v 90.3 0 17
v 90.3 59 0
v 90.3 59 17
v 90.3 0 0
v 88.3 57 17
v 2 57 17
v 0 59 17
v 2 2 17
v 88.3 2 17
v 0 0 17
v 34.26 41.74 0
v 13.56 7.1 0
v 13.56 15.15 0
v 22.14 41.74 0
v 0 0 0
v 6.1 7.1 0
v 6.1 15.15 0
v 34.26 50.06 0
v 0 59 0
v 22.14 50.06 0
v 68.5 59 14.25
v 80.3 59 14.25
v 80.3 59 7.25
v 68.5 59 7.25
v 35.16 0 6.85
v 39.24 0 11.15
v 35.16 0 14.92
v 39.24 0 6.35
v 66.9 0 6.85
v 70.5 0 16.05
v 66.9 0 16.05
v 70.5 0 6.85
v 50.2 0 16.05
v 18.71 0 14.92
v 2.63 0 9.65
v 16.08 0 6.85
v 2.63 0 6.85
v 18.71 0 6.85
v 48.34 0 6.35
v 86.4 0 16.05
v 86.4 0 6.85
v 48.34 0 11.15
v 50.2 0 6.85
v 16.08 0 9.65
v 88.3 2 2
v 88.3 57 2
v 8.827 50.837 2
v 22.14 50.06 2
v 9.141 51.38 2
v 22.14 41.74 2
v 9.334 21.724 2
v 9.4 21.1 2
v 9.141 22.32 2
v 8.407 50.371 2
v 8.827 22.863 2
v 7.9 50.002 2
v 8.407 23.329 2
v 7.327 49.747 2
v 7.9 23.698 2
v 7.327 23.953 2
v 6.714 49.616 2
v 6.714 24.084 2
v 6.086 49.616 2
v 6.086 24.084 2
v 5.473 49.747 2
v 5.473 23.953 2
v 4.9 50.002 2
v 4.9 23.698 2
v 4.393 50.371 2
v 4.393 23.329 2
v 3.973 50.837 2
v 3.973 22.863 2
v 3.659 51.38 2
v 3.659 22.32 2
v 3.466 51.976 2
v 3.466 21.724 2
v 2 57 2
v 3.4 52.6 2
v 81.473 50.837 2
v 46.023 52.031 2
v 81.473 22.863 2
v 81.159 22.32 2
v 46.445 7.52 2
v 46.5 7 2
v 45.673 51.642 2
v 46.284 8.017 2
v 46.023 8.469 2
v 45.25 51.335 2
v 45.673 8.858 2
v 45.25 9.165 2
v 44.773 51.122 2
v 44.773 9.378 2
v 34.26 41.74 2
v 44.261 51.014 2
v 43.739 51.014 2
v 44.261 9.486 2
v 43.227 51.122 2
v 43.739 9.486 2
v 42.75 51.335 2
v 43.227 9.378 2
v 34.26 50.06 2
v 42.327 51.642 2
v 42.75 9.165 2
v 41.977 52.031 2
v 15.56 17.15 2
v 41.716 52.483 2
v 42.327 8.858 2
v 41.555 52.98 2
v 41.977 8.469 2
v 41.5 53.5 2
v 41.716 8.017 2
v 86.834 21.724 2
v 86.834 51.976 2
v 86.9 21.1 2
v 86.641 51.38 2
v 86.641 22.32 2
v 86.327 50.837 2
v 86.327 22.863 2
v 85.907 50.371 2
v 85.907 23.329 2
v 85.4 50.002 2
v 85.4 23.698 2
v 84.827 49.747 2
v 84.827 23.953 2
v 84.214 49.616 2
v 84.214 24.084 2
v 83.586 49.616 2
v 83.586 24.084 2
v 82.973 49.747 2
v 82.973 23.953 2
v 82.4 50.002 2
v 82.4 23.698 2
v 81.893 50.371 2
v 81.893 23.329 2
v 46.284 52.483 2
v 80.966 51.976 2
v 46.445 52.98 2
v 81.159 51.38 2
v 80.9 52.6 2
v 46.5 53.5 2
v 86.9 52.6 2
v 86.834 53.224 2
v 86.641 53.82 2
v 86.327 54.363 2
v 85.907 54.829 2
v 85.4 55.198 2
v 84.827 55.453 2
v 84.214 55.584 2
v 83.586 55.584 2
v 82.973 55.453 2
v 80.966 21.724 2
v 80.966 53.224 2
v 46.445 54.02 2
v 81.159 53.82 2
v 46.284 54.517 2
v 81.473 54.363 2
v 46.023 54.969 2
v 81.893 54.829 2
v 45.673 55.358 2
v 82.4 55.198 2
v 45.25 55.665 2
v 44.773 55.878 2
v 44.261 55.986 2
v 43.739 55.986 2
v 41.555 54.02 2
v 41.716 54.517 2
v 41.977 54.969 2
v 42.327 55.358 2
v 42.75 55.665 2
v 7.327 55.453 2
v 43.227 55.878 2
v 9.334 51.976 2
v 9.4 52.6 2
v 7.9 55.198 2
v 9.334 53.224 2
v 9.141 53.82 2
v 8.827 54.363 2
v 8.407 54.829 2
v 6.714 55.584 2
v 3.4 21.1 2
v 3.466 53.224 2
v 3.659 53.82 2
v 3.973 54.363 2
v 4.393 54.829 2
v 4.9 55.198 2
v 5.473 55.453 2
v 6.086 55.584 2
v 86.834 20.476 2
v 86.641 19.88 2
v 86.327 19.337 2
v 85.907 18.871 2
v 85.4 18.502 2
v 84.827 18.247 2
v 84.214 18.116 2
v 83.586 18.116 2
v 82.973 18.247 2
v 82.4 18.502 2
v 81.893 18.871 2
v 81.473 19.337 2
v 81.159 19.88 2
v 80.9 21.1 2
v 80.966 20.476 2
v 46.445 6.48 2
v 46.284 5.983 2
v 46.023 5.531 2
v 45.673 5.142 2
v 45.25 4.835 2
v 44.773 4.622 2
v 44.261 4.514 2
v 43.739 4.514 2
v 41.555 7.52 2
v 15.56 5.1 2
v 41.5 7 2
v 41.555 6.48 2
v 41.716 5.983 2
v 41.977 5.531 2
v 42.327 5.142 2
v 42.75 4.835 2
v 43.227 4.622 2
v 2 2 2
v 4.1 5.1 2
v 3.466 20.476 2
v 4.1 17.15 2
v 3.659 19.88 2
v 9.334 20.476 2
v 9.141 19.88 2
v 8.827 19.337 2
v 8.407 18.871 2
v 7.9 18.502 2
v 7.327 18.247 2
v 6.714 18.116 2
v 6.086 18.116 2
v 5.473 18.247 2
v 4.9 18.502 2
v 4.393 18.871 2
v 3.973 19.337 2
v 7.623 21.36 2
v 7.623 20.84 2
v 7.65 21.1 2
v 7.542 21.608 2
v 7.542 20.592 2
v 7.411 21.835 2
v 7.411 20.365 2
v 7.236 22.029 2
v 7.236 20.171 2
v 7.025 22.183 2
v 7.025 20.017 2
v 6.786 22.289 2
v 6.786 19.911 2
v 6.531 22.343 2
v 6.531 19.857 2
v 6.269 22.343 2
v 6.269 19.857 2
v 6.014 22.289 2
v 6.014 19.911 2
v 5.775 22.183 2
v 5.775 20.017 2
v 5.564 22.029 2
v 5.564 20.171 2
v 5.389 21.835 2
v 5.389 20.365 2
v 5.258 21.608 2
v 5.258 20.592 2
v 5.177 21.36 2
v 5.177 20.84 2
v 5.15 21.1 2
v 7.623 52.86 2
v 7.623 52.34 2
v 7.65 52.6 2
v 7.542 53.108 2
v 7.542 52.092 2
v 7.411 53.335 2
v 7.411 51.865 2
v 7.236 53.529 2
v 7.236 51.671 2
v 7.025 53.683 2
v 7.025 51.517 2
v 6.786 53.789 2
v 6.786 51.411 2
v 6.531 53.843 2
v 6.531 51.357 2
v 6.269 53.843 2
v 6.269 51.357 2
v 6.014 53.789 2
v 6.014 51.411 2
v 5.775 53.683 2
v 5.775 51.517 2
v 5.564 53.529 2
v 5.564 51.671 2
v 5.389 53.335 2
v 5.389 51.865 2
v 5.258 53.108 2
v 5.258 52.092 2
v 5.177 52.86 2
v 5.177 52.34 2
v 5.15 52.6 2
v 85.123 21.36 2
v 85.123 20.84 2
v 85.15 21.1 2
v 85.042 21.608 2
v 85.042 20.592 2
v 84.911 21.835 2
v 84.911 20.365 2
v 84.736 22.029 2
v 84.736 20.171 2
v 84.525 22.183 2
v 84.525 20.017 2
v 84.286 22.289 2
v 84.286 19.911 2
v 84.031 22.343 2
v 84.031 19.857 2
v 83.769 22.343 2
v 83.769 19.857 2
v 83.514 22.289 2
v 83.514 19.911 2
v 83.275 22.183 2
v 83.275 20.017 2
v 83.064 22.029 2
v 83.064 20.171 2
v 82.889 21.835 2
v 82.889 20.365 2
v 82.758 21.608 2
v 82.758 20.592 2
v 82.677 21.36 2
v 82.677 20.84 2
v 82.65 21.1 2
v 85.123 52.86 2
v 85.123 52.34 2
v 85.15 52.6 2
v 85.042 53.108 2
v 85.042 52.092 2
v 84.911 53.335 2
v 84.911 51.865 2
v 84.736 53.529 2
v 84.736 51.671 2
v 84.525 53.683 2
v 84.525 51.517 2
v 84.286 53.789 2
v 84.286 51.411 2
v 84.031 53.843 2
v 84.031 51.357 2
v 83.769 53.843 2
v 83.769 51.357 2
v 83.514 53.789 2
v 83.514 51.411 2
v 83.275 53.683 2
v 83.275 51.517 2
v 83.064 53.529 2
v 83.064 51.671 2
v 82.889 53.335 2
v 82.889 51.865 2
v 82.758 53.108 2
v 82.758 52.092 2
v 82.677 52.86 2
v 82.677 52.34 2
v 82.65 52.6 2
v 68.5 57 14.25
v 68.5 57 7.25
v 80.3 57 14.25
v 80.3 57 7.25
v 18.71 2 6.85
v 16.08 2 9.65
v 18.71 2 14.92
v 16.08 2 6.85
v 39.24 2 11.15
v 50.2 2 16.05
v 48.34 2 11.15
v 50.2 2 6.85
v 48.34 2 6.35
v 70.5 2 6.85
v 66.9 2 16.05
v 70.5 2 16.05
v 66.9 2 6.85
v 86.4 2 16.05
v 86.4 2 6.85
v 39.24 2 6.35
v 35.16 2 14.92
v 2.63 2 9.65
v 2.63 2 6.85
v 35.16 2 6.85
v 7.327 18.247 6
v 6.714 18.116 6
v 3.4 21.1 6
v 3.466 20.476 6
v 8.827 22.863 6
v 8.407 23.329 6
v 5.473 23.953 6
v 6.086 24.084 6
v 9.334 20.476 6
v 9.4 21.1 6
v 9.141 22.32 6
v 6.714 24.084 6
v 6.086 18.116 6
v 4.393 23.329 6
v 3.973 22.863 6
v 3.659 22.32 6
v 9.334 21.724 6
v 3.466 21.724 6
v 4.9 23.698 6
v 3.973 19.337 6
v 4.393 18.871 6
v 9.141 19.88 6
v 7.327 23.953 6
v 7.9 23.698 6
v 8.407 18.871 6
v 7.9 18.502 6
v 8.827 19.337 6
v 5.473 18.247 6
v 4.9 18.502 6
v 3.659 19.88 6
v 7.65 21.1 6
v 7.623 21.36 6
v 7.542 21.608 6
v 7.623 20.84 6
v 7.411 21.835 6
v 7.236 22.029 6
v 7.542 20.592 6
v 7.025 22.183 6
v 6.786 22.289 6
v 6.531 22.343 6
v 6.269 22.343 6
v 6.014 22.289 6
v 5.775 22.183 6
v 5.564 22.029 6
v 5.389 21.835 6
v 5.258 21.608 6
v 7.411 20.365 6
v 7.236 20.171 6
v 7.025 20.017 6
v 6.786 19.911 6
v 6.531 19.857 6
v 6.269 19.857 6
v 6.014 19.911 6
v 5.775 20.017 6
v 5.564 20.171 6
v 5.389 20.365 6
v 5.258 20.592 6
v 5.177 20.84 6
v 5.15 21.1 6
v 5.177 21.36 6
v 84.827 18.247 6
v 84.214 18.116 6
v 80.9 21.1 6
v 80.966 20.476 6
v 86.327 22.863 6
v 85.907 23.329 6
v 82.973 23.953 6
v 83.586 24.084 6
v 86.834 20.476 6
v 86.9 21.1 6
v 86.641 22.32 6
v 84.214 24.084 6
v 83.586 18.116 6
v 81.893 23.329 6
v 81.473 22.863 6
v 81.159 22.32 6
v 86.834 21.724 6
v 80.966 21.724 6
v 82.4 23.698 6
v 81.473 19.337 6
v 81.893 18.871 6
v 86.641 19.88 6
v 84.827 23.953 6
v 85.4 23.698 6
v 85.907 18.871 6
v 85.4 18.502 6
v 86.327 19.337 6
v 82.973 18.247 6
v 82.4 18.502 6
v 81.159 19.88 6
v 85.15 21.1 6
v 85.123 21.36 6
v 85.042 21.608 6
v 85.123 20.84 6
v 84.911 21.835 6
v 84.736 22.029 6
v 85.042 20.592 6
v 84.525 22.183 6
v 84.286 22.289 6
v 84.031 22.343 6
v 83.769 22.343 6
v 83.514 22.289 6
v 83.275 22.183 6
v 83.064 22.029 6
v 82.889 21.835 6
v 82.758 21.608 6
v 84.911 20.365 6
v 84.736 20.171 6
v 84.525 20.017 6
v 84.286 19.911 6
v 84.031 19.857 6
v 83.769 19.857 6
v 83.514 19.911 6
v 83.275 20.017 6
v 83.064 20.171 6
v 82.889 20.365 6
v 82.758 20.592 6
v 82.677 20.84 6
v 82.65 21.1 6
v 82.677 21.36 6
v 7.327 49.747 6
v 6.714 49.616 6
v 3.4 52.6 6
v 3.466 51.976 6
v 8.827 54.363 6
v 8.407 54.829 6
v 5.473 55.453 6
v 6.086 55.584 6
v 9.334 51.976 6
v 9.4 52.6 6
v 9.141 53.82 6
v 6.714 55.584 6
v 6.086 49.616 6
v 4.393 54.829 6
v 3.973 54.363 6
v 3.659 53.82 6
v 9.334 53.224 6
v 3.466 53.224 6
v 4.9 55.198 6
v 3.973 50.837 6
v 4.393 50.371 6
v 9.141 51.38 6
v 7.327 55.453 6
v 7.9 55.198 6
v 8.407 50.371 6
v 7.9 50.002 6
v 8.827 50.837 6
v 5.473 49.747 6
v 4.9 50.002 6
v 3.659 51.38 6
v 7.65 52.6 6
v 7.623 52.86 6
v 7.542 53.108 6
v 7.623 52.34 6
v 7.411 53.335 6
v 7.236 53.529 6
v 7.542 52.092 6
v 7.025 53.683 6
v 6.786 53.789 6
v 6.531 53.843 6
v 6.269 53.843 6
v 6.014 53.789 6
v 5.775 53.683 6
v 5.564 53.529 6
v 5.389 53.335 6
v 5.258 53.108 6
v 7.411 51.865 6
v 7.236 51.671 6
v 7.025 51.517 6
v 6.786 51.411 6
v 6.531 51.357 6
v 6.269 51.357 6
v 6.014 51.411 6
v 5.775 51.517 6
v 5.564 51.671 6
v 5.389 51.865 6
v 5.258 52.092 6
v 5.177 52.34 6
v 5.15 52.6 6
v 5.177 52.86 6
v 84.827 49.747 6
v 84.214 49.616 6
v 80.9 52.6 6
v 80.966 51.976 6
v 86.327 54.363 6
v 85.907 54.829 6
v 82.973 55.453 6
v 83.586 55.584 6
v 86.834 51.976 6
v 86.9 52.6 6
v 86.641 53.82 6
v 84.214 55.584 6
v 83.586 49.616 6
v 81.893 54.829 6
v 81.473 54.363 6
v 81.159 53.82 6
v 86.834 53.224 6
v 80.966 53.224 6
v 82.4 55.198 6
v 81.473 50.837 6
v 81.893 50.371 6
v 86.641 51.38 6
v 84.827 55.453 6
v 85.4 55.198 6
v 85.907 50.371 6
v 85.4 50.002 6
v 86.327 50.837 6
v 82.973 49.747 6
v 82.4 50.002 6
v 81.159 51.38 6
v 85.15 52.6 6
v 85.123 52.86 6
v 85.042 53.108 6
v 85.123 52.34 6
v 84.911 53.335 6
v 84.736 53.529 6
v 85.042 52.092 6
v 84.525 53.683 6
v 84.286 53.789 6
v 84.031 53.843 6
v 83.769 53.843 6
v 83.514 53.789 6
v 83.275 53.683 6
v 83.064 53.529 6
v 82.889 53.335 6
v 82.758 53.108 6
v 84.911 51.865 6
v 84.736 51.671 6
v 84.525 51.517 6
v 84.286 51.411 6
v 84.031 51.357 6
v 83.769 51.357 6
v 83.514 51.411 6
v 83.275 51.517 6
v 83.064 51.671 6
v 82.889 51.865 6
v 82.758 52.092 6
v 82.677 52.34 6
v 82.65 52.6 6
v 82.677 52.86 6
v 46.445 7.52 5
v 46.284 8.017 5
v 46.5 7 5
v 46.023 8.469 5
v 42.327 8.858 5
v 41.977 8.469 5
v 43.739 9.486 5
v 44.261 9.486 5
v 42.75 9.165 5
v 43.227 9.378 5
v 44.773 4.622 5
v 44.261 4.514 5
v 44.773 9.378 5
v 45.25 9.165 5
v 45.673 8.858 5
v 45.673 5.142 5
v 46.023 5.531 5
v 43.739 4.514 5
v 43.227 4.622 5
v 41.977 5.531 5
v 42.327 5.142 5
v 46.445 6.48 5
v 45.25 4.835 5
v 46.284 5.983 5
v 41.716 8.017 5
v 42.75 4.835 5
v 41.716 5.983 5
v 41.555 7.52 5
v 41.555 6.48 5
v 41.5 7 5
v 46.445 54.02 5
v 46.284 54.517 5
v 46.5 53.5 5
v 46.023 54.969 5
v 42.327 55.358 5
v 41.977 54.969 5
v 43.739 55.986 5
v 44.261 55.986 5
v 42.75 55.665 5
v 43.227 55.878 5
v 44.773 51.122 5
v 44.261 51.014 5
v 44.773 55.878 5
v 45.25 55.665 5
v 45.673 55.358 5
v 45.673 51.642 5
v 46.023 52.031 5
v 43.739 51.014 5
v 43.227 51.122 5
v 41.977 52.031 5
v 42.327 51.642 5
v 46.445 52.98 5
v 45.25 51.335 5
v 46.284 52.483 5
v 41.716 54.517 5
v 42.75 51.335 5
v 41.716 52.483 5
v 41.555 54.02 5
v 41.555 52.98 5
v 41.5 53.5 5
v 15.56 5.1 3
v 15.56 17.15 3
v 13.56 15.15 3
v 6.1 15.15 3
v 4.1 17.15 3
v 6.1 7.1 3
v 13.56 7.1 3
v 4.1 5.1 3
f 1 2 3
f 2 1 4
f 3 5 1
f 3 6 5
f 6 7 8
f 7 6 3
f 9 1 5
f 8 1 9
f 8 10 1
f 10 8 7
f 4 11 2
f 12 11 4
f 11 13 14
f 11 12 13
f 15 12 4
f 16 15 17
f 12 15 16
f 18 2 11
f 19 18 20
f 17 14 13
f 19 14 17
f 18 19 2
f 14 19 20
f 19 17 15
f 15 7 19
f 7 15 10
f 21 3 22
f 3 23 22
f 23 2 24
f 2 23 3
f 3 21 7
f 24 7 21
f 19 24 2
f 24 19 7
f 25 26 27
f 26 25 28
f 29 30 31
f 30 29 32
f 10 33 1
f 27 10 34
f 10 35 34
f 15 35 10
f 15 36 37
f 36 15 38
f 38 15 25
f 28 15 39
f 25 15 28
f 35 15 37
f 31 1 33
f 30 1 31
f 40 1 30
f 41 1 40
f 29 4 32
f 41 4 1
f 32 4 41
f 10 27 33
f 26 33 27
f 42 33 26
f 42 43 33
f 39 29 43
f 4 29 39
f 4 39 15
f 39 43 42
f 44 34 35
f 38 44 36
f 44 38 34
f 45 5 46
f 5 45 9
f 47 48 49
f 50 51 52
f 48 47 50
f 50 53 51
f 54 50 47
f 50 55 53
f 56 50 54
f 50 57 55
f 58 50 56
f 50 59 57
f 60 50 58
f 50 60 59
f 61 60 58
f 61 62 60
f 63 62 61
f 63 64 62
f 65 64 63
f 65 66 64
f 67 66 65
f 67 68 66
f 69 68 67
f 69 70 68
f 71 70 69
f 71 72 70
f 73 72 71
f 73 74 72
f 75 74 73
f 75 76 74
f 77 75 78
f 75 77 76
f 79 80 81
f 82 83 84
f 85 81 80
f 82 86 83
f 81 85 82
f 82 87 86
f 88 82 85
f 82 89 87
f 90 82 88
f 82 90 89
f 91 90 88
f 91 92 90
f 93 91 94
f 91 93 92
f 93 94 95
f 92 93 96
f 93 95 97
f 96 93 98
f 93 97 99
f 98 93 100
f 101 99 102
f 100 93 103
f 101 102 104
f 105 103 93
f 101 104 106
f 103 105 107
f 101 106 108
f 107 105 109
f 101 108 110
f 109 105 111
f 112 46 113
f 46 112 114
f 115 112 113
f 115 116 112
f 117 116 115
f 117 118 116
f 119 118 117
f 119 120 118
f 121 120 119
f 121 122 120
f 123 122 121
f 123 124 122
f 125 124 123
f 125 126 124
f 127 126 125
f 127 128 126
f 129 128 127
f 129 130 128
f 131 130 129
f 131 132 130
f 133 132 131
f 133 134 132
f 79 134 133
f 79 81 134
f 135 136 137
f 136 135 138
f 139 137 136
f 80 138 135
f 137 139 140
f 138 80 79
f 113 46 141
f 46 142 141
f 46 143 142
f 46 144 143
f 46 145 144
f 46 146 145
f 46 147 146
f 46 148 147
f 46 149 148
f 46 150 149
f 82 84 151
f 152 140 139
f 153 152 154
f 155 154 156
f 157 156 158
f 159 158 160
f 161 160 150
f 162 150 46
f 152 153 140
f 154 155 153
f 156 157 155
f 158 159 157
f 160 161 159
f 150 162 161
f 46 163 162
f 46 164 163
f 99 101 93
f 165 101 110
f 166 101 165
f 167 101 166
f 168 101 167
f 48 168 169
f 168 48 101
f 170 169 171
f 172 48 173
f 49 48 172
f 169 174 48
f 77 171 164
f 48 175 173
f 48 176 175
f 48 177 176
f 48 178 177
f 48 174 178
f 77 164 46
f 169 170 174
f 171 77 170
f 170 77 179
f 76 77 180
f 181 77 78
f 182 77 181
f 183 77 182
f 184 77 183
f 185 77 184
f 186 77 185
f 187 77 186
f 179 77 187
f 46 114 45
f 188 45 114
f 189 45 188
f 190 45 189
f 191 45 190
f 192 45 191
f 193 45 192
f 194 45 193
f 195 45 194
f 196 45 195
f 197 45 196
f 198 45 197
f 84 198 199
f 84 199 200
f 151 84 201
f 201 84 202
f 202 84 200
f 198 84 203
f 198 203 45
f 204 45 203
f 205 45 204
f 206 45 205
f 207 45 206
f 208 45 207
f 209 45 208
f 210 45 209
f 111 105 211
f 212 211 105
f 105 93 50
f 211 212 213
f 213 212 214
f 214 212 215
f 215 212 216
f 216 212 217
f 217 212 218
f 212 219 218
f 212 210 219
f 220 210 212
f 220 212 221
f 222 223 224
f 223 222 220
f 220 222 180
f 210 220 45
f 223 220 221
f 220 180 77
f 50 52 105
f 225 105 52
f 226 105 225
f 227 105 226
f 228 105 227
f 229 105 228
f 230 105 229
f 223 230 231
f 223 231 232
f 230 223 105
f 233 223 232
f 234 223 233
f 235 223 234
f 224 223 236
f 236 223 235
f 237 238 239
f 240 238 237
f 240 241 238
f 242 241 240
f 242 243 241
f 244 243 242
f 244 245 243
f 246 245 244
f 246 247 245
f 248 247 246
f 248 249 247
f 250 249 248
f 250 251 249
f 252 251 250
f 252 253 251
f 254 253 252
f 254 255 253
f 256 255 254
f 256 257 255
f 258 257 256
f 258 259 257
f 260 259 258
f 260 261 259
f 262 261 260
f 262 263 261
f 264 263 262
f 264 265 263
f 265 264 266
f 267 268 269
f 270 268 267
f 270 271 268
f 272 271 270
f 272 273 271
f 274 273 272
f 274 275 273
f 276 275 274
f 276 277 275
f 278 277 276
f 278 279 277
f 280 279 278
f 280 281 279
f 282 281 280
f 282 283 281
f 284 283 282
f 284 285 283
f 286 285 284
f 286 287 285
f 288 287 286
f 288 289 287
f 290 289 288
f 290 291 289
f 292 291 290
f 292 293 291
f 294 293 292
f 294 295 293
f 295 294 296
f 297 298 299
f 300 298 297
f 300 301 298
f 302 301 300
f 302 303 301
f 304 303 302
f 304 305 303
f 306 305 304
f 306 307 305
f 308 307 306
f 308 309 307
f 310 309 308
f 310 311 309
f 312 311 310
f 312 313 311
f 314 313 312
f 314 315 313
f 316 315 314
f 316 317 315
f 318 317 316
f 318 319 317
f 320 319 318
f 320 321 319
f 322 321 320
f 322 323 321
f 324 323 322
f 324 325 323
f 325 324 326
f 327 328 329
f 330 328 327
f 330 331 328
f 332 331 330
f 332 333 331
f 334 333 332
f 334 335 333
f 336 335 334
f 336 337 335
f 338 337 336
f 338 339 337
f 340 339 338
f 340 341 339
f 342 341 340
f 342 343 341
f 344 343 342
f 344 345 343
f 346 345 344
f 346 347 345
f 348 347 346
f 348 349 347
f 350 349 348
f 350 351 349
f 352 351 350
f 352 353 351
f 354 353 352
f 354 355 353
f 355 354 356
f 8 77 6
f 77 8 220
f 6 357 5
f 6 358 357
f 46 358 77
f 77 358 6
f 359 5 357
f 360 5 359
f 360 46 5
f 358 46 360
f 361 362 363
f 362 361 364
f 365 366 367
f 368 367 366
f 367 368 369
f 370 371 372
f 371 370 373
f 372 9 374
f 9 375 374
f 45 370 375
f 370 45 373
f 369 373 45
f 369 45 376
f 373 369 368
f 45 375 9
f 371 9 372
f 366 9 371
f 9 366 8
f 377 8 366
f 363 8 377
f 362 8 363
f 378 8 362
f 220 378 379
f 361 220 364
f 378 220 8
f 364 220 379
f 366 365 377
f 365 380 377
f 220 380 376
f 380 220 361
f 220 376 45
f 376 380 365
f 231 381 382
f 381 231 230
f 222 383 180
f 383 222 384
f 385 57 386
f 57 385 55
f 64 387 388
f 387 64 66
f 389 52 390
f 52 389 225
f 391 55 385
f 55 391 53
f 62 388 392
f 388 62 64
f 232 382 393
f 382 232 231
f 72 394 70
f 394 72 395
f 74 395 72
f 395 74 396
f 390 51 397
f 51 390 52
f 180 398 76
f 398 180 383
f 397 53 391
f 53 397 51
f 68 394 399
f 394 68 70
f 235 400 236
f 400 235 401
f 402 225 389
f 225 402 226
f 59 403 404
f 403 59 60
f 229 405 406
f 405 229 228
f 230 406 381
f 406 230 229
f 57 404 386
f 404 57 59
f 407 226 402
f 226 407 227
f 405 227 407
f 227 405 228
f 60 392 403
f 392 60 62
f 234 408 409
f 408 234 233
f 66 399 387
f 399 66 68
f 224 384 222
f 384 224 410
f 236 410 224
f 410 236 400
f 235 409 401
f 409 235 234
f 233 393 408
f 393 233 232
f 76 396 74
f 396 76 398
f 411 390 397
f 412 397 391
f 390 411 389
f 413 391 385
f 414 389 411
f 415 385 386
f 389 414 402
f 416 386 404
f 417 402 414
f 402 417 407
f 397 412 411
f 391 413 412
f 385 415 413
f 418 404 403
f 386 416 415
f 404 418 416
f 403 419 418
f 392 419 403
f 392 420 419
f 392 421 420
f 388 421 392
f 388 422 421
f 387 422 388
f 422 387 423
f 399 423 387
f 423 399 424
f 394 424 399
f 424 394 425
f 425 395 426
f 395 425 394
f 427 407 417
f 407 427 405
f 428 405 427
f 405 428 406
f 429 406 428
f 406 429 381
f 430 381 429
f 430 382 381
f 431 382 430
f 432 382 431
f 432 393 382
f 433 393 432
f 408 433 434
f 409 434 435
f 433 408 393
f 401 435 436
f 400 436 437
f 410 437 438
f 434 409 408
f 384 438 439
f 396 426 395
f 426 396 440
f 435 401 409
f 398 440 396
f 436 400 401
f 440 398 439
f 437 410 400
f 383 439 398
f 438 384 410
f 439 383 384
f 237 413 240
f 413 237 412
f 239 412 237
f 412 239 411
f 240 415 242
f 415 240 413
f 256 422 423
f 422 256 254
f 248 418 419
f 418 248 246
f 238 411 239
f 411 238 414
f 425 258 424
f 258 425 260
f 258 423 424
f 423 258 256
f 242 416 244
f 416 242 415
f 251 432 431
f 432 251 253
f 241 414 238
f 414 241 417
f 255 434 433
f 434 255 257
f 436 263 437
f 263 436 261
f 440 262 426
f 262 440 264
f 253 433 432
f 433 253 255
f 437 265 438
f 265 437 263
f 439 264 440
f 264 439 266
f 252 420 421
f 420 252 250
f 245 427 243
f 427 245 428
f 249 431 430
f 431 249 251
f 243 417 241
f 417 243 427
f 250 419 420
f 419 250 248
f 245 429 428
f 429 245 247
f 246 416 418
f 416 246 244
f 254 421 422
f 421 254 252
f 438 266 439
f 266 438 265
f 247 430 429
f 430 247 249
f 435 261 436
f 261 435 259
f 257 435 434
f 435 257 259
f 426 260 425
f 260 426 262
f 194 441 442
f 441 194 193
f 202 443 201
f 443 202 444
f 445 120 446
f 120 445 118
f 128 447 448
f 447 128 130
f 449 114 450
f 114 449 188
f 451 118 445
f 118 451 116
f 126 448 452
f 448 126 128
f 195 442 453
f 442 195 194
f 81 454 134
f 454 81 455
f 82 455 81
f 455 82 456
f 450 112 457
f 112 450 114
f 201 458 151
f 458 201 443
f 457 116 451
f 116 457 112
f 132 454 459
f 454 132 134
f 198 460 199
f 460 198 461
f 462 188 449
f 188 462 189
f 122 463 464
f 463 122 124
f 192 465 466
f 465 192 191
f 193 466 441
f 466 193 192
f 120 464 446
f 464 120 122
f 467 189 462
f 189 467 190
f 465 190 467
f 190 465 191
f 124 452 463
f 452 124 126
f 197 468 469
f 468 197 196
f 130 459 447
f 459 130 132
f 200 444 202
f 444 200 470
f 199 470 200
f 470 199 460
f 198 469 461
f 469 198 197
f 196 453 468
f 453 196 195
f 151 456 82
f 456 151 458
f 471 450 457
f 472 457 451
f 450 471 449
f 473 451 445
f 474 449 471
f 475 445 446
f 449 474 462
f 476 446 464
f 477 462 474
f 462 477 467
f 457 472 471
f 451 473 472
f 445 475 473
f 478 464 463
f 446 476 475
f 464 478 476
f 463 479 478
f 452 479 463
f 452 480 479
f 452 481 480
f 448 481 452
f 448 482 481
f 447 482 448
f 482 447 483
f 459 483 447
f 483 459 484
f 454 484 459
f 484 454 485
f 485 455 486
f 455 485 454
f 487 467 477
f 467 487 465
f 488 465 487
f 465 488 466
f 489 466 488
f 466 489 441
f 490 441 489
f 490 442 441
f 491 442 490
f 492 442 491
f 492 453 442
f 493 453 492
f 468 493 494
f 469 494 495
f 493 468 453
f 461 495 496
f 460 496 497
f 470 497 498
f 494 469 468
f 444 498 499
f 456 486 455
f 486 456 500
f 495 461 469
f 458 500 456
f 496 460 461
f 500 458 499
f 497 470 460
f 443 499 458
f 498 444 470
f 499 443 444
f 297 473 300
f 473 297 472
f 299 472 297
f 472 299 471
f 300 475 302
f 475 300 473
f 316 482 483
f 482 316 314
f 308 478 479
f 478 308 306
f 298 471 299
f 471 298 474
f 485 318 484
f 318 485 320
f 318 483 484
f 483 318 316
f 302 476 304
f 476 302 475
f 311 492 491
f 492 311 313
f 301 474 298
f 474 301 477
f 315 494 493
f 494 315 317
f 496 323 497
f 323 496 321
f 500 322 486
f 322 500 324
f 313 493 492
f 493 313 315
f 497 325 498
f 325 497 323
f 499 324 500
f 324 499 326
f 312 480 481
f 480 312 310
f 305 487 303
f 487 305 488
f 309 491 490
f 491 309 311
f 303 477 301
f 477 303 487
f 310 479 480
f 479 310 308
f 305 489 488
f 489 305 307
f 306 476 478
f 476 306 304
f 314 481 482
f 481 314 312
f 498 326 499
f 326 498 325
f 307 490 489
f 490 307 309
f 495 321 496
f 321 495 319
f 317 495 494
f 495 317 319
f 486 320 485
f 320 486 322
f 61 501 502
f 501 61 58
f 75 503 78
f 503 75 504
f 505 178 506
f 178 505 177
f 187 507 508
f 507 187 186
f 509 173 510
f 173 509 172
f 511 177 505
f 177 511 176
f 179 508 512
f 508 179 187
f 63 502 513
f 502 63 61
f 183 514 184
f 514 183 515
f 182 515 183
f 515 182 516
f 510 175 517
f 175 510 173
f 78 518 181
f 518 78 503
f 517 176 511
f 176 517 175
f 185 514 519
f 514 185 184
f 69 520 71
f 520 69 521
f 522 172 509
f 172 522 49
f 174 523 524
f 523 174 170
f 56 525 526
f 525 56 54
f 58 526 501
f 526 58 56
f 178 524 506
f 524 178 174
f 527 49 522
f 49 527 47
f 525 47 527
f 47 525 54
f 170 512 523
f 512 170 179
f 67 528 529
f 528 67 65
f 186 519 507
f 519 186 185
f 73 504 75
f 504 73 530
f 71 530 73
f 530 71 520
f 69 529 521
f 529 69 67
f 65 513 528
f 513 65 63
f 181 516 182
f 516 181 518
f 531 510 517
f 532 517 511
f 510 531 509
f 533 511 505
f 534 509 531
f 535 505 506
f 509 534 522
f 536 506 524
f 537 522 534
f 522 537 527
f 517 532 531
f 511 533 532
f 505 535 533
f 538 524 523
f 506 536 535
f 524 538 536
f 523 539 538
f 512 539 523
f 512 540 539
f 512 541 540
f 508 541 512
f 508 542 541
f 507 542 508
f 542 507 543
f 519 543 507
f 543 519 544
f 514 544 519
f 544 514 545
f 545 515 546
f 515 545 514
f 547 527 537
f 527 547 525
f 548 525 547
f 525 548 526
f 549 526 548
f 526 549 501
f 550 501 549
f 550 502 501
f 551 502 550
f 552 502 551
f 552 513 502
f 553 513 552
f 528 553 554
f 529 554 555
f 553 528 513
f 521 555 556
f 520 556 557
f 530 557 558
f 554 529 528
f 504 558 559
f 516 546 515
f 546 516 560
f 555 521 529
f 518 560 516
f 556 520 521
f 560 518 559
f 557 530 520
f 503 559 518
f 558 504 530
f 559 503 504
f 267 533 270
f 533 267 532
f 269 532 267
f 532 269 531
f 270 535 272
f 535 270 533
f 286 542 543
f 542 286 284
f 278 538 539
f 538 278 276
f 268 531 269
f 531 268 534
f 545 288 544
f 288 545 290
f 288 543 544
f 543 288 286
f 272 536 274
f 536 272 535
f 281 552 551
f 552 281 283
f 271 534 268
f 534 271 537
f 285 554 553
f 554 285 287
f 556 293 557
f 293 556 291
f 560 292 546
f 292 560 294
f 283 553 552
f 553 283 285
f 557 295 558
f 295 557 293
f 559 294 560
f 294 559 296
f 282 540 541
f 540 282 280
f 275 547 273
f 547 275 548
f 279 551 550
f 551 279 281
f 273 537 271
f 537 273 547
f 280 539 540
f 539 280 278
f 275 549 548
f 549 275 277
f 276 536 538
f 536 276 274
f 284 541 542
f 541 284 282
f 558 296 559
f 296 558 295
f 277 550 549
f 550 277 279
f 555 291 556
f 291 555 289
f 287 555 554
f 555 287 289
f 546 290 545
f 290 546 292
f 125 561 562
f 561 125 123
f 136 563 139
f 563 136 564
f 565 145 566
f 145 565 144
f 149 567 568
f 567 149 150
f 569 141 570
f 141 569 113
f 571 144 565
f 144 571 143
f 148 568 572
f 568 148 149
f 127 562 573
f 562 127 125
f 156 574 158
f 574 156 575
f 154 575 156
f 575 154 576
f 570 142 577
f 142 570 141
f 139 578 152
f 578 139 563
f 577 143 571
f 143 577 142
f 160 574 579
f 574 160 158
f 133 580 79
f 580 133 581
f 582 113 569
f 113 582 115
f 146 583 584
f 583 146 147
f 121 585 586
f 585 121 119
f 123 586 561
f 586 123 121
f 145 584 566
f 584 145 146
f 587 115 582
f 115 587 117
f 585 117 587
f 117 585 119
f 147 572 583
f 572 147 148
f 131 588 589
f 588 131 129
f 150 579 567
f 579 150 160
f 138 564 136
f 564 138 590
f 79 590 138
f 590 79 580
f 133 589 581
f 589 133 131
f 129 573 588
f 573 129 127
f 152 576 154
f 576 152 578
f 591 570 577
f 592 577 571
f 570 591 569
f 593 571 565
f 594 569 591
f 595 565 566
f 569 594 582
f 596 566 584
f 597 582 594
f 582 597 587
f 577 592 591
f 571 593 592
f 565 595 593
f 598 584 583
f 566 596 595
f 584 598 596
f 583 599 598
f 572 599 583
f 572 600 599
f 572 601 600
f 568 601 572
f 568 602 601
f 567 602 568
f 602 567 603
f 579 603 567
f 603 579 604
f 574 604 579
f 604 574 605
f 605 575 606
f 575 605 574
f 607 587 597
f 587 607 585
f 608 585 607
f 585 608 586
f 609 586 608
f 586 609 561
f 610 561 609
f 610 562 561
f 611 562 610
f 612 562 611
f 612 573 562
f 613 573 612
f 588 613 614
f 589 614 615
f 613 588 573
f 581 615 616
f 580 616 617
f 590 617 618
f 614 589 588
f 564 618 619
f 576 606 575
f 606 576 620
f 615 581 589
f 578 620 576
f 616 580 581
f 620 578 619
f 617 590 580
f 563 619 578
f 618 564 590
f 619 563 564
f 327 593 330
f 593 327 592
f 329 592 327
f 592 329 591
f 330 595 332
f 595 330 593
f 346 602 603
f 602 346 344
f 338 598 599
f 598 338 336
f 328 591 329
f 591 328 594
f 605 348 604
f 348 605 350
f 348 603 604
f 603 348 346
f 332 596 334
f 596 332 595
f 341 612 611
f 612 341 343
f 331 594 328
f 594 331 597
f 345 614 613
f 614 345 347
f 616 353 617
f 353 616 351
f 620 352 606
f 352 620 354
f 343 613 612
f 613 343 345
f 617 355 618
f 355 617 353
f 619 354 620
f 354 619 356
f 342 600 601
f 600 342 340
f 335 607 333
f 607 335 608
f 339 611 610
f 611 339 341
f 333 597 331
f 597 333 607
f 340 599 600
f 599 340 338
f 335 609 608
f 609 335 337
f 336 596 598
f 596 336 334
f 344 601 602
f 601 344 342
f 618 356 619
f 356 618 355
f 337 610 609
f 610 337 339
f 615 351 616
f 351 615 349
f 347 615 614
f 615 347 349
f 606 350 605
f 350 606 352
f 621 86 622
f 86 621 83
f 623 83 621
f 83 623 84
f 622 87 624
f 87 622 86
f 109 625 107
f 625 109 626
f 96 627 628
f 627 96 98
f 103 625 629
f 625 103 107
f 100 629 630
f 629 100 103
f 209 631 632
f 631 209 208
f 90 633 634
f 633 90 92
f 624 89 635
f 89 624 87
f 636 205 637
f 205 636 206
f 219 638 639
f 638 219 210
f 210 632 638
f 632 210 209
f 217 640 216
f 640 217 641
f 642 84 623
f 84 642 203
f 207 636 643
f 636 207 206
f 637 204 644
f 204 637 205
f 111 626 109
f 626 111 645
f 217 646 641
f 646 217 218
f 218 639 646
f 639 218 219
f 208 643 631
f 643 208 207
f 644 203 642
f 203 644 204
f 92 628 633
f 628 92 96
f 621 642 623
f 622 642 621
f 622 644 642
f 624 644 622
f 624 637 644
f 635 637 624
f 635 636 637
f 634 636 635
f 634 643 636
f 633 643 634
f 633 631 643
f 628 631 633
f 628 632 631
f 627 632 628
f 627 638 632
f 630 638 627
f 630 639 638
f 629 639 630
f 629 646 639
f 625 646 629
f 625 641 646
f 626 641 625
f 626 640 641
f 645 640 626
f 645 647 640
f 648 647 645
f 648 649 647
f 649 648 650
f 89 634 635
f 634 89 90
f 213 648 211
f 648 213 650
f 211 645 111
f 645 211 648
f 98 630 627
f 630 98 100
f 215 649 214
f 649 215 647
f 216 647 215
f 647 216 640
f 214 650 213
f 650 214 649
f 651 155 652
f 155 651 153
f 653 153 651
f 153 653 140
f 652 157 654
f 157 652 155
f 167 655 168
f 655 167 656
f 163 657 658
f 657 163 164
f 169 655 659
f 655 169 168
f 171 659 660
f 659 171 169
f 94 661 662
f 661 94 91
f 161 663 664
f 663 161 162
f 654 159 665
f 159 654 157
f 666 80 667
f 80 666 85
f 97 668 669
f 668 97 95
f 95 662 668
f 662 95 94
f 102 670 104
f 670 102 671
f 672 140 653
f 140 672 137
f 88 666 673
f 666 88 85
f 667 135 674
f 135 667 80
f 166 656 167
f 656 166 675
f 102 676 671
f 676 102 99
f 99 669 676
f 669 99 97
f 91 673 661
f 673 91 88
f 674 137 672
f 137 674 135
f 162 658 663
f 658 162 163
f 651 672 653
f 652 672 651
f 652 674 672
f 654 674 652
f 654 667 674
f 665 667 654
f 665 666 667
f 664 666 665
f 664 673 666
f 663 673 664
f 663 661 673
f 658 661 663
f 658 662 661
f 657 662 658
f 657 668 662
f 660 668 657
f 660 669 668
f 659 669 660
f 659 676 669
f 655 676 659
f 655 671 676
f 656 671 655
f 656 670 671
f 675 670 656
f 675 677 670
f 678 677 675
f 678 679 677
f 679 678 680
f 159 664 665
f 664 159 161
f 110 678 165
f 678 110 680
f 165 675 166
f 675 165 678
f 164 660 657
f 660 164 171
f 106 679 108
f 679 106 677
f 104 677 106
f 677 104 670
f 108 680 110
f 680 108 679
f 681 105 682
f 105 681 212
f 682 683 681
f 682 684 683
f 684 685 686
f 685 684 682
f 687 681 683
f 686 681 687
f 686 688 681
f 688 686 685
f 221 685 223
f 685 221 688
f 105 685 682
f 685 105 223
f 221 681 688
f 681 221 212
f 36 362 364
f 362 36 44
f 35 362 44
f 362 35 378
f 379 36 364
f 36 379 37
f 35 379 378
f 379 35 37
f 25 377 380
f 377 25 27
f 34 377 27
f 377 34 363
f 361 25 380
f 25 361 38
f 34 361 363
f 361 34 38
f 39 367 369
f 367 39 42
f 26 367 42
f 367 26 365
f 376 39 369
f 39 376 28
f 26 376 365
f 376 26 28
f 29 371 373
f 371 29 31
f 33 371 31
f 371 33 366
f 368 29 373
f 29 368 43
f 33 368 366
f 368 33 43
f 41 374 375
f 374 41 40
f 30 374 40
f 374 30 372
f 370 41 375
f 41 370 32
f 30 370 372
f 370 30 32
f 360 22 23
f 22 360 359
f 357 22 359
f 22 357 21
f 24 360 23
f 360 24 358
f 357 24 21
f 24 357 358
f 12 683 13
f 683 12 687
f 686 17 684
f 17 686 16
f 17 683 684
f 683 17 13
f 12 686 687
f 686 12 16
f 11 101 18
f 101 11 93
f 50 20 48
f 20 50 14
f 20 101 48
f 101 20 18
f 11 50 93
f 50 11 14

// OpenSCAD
// wall thickness
th = 2;

// board size
bx = 85.5;
by = 54.2;

// gap around board 
g = 0.4;
thg = th + g;

// outter dimensions
ox = bx + (thg * 2);
oy = by + (thg * 2);

// board z offset
bzo = 4 + th;

module basicBox()
{
    difference()
    {
        cube([ox, oy, 17]);
        translate([th, th, th])
            cube([bx + g * 2, by + g * 2, 17]);
    }
}

module stand( x, y )
{
    translate([x, y, 0])
    {
        difference() {
        cylinder( bzo, d = 6, $fn = 30 );
        cylinder( bzo, d = 2.5, $fn = 30 );
        }
    }
}

module BottomScrewHole( x, y )
{
    translate([x, y, -1])
    {
        cylinder( bzo + 2, d = 3.2, $fn = 30 );
        cylinder( 6 - th, d = 7.1, $fn = 6 );
    }
}

module TopScrewHole( x, y )
{
    translate([x, y, -1])
    {
        cylinder( 9.6 + 2 + th, d = 3.1, $fn = 30 );
        cylinder( th + 1, d = 6.2, $fn = 30 );
    }
}
module TopScrewMount( x, y )
{
    translate([x, y, 0])
    {
        cylinder( th + 9.6, d = 6.2, $fn = 60 );
    }
}

module frontHole(x, z, w, h)
{
    translate([x, -10, z + 1.25])
        cube([w, 13, h + (g * 2)]);
}

module bottom() 
{
    difference()
    {
        union()
        {
            basicBox();
            translate([thg, thg, 0])
            {
                stand( 4, 18.7 );
                stand( bx - 4, 18.7 );
                stand( 4, 50.2 );
                stand( bx - 4, 50.2 );
            }
            // more supports
            translate([44, th + 5, 0])
            {
                cylinder( bzo-1, d = 5, $fn = 30 );
            }
            translate([44, 53.5, 0])
            {
                cylinder( bzo-1, d = 5, $fn = 30 );
            }
            
            translate([6.5 - thg, 7.5 - thg, 0])
            {
                cube([6.66 + (2 * thg), 7.25 + (2 * thg), th +1]);
            }
        }
        union()
        {
            // SD card
            frontHole( 2.63, bzo - g, 13.45, 2.00 );
            
            // HDMI
            frontHole( 18.71, bzo - g, 16.45, 7.27 );
            
            // otg
            frontHole( 39.24, (bzo - 0.5) - g, 9.1, 4 );
            
            // USB1
            frontHole( 50.2, bzo - g, 16.7, 8.4 );
            
            // USB2
            frontHole( 70.5, bzo - g, 15.9, 8.4 );
            
            // power 
            translate([68.5, oy - 10, bzo + 1.25])
                cube([11.8, 20, 7]);
            
            // switches
            translate([6.5 - g, 7.5 - g, -1])
                cube([6.66 + (2 * g), 7.25 + (2 * g), bzo + 2]);
                
            // JTAG
            jtag_width = 7.32;
            jtag_length = 3.52;
            jtag_offset = 2.4;
            jtag_x = jtag_width + (2 * jtag_offset);
            jtag_y = jtag_length + (2 * jtag_offset);
            
            translate([27.8 + g, 45.5 + g, -1])
                cube([jtag_x, jtag_y, 17], center=true);
                
            // UART
            uart_width = 42.0;
            uart_length = 15.4;
            uart_thickness = 10.0;
            uart_offset = 2.0;
            uart_x = uart_width + (2 * uart_offset);
            uart_y = uart_length + (2 * uart_offset);
            
            //translate([8, by,  9])
                //cube([42 + 4, th + 4, 25]);
            
                // GPIO access
            //translate([9, thg - 3, -1])
              //  cube([42 + 4, 9.75, th + 2]);
              
            // screw holes with captured nuts
            translate([thg, thg, 0])
            {
                //BottomScrewHole( 4, 18.7 );
                //BottomScrewHole( bx - 4, 18.7 );
                //BottomScrewHole( 4, 50.2 );
                //BottomScrewHole( bx - 4, 50.2 );
            }
        }
    }
}

module topSupport(x, y, type)
{
    translate([x, y, th])
    {
        if( type == "a" )
            cube([th, 6, 5]);
        if( type == "b" )
            cube([6, th, 5]);
    }
}

module top()
{
    difference()
    {
        union()
        {
            cube([ox, oy, th]);
            //topSupport( thg, thg, "a" );
            //topSupport( thg, 34, "a" );
            topSupport( ox - (thg + th), thg, "a" );
            topSupport( ox - (thg + th), oy - (thg + 6 + 17), "a" );
            topSupport( thg, oy - (thg + 6), "a" );
            
            topSupport( 60, thg, "b");
            topSupport( 40, oy - (thg + th), "b");
            
            
            TopScrewMount( thg + 4, oy - (18.7 + thg) );
            TopScrewMount( thg + (bx - 4), oy - (18.7 + thg) );
            TopScrewMount( thg + 4, oy - (50.2 + thg) );
            TopScrewMount( thg + (bx - 4), oy - (50.2 + thg) );
            
        }
        union()
        {
            // GPIO access
            //translate([9.0, thg - 3, -1.99])
                //cube([42 + 4, 18, th + 2]);
            
            // recovery
            translate([15, 24, -1])
                cube([7.5, 4.5, th + 2]);
            
            TopScrewHole( thg + 4, oy - (18.7 + thg) );
            TopScrewHole( thg + (bx - 4), oy - (18.7 + thg) );
            TopScrewHole( thg + 4, oy - (50.2 + thg) );
            TopScrewHole( thg + (bx - 4), oy - (50.2 + thg) );
        }
    }
}

union()
{
    bottom();
    //translate([0, oy + 5, 0])top();
    //top();
}
